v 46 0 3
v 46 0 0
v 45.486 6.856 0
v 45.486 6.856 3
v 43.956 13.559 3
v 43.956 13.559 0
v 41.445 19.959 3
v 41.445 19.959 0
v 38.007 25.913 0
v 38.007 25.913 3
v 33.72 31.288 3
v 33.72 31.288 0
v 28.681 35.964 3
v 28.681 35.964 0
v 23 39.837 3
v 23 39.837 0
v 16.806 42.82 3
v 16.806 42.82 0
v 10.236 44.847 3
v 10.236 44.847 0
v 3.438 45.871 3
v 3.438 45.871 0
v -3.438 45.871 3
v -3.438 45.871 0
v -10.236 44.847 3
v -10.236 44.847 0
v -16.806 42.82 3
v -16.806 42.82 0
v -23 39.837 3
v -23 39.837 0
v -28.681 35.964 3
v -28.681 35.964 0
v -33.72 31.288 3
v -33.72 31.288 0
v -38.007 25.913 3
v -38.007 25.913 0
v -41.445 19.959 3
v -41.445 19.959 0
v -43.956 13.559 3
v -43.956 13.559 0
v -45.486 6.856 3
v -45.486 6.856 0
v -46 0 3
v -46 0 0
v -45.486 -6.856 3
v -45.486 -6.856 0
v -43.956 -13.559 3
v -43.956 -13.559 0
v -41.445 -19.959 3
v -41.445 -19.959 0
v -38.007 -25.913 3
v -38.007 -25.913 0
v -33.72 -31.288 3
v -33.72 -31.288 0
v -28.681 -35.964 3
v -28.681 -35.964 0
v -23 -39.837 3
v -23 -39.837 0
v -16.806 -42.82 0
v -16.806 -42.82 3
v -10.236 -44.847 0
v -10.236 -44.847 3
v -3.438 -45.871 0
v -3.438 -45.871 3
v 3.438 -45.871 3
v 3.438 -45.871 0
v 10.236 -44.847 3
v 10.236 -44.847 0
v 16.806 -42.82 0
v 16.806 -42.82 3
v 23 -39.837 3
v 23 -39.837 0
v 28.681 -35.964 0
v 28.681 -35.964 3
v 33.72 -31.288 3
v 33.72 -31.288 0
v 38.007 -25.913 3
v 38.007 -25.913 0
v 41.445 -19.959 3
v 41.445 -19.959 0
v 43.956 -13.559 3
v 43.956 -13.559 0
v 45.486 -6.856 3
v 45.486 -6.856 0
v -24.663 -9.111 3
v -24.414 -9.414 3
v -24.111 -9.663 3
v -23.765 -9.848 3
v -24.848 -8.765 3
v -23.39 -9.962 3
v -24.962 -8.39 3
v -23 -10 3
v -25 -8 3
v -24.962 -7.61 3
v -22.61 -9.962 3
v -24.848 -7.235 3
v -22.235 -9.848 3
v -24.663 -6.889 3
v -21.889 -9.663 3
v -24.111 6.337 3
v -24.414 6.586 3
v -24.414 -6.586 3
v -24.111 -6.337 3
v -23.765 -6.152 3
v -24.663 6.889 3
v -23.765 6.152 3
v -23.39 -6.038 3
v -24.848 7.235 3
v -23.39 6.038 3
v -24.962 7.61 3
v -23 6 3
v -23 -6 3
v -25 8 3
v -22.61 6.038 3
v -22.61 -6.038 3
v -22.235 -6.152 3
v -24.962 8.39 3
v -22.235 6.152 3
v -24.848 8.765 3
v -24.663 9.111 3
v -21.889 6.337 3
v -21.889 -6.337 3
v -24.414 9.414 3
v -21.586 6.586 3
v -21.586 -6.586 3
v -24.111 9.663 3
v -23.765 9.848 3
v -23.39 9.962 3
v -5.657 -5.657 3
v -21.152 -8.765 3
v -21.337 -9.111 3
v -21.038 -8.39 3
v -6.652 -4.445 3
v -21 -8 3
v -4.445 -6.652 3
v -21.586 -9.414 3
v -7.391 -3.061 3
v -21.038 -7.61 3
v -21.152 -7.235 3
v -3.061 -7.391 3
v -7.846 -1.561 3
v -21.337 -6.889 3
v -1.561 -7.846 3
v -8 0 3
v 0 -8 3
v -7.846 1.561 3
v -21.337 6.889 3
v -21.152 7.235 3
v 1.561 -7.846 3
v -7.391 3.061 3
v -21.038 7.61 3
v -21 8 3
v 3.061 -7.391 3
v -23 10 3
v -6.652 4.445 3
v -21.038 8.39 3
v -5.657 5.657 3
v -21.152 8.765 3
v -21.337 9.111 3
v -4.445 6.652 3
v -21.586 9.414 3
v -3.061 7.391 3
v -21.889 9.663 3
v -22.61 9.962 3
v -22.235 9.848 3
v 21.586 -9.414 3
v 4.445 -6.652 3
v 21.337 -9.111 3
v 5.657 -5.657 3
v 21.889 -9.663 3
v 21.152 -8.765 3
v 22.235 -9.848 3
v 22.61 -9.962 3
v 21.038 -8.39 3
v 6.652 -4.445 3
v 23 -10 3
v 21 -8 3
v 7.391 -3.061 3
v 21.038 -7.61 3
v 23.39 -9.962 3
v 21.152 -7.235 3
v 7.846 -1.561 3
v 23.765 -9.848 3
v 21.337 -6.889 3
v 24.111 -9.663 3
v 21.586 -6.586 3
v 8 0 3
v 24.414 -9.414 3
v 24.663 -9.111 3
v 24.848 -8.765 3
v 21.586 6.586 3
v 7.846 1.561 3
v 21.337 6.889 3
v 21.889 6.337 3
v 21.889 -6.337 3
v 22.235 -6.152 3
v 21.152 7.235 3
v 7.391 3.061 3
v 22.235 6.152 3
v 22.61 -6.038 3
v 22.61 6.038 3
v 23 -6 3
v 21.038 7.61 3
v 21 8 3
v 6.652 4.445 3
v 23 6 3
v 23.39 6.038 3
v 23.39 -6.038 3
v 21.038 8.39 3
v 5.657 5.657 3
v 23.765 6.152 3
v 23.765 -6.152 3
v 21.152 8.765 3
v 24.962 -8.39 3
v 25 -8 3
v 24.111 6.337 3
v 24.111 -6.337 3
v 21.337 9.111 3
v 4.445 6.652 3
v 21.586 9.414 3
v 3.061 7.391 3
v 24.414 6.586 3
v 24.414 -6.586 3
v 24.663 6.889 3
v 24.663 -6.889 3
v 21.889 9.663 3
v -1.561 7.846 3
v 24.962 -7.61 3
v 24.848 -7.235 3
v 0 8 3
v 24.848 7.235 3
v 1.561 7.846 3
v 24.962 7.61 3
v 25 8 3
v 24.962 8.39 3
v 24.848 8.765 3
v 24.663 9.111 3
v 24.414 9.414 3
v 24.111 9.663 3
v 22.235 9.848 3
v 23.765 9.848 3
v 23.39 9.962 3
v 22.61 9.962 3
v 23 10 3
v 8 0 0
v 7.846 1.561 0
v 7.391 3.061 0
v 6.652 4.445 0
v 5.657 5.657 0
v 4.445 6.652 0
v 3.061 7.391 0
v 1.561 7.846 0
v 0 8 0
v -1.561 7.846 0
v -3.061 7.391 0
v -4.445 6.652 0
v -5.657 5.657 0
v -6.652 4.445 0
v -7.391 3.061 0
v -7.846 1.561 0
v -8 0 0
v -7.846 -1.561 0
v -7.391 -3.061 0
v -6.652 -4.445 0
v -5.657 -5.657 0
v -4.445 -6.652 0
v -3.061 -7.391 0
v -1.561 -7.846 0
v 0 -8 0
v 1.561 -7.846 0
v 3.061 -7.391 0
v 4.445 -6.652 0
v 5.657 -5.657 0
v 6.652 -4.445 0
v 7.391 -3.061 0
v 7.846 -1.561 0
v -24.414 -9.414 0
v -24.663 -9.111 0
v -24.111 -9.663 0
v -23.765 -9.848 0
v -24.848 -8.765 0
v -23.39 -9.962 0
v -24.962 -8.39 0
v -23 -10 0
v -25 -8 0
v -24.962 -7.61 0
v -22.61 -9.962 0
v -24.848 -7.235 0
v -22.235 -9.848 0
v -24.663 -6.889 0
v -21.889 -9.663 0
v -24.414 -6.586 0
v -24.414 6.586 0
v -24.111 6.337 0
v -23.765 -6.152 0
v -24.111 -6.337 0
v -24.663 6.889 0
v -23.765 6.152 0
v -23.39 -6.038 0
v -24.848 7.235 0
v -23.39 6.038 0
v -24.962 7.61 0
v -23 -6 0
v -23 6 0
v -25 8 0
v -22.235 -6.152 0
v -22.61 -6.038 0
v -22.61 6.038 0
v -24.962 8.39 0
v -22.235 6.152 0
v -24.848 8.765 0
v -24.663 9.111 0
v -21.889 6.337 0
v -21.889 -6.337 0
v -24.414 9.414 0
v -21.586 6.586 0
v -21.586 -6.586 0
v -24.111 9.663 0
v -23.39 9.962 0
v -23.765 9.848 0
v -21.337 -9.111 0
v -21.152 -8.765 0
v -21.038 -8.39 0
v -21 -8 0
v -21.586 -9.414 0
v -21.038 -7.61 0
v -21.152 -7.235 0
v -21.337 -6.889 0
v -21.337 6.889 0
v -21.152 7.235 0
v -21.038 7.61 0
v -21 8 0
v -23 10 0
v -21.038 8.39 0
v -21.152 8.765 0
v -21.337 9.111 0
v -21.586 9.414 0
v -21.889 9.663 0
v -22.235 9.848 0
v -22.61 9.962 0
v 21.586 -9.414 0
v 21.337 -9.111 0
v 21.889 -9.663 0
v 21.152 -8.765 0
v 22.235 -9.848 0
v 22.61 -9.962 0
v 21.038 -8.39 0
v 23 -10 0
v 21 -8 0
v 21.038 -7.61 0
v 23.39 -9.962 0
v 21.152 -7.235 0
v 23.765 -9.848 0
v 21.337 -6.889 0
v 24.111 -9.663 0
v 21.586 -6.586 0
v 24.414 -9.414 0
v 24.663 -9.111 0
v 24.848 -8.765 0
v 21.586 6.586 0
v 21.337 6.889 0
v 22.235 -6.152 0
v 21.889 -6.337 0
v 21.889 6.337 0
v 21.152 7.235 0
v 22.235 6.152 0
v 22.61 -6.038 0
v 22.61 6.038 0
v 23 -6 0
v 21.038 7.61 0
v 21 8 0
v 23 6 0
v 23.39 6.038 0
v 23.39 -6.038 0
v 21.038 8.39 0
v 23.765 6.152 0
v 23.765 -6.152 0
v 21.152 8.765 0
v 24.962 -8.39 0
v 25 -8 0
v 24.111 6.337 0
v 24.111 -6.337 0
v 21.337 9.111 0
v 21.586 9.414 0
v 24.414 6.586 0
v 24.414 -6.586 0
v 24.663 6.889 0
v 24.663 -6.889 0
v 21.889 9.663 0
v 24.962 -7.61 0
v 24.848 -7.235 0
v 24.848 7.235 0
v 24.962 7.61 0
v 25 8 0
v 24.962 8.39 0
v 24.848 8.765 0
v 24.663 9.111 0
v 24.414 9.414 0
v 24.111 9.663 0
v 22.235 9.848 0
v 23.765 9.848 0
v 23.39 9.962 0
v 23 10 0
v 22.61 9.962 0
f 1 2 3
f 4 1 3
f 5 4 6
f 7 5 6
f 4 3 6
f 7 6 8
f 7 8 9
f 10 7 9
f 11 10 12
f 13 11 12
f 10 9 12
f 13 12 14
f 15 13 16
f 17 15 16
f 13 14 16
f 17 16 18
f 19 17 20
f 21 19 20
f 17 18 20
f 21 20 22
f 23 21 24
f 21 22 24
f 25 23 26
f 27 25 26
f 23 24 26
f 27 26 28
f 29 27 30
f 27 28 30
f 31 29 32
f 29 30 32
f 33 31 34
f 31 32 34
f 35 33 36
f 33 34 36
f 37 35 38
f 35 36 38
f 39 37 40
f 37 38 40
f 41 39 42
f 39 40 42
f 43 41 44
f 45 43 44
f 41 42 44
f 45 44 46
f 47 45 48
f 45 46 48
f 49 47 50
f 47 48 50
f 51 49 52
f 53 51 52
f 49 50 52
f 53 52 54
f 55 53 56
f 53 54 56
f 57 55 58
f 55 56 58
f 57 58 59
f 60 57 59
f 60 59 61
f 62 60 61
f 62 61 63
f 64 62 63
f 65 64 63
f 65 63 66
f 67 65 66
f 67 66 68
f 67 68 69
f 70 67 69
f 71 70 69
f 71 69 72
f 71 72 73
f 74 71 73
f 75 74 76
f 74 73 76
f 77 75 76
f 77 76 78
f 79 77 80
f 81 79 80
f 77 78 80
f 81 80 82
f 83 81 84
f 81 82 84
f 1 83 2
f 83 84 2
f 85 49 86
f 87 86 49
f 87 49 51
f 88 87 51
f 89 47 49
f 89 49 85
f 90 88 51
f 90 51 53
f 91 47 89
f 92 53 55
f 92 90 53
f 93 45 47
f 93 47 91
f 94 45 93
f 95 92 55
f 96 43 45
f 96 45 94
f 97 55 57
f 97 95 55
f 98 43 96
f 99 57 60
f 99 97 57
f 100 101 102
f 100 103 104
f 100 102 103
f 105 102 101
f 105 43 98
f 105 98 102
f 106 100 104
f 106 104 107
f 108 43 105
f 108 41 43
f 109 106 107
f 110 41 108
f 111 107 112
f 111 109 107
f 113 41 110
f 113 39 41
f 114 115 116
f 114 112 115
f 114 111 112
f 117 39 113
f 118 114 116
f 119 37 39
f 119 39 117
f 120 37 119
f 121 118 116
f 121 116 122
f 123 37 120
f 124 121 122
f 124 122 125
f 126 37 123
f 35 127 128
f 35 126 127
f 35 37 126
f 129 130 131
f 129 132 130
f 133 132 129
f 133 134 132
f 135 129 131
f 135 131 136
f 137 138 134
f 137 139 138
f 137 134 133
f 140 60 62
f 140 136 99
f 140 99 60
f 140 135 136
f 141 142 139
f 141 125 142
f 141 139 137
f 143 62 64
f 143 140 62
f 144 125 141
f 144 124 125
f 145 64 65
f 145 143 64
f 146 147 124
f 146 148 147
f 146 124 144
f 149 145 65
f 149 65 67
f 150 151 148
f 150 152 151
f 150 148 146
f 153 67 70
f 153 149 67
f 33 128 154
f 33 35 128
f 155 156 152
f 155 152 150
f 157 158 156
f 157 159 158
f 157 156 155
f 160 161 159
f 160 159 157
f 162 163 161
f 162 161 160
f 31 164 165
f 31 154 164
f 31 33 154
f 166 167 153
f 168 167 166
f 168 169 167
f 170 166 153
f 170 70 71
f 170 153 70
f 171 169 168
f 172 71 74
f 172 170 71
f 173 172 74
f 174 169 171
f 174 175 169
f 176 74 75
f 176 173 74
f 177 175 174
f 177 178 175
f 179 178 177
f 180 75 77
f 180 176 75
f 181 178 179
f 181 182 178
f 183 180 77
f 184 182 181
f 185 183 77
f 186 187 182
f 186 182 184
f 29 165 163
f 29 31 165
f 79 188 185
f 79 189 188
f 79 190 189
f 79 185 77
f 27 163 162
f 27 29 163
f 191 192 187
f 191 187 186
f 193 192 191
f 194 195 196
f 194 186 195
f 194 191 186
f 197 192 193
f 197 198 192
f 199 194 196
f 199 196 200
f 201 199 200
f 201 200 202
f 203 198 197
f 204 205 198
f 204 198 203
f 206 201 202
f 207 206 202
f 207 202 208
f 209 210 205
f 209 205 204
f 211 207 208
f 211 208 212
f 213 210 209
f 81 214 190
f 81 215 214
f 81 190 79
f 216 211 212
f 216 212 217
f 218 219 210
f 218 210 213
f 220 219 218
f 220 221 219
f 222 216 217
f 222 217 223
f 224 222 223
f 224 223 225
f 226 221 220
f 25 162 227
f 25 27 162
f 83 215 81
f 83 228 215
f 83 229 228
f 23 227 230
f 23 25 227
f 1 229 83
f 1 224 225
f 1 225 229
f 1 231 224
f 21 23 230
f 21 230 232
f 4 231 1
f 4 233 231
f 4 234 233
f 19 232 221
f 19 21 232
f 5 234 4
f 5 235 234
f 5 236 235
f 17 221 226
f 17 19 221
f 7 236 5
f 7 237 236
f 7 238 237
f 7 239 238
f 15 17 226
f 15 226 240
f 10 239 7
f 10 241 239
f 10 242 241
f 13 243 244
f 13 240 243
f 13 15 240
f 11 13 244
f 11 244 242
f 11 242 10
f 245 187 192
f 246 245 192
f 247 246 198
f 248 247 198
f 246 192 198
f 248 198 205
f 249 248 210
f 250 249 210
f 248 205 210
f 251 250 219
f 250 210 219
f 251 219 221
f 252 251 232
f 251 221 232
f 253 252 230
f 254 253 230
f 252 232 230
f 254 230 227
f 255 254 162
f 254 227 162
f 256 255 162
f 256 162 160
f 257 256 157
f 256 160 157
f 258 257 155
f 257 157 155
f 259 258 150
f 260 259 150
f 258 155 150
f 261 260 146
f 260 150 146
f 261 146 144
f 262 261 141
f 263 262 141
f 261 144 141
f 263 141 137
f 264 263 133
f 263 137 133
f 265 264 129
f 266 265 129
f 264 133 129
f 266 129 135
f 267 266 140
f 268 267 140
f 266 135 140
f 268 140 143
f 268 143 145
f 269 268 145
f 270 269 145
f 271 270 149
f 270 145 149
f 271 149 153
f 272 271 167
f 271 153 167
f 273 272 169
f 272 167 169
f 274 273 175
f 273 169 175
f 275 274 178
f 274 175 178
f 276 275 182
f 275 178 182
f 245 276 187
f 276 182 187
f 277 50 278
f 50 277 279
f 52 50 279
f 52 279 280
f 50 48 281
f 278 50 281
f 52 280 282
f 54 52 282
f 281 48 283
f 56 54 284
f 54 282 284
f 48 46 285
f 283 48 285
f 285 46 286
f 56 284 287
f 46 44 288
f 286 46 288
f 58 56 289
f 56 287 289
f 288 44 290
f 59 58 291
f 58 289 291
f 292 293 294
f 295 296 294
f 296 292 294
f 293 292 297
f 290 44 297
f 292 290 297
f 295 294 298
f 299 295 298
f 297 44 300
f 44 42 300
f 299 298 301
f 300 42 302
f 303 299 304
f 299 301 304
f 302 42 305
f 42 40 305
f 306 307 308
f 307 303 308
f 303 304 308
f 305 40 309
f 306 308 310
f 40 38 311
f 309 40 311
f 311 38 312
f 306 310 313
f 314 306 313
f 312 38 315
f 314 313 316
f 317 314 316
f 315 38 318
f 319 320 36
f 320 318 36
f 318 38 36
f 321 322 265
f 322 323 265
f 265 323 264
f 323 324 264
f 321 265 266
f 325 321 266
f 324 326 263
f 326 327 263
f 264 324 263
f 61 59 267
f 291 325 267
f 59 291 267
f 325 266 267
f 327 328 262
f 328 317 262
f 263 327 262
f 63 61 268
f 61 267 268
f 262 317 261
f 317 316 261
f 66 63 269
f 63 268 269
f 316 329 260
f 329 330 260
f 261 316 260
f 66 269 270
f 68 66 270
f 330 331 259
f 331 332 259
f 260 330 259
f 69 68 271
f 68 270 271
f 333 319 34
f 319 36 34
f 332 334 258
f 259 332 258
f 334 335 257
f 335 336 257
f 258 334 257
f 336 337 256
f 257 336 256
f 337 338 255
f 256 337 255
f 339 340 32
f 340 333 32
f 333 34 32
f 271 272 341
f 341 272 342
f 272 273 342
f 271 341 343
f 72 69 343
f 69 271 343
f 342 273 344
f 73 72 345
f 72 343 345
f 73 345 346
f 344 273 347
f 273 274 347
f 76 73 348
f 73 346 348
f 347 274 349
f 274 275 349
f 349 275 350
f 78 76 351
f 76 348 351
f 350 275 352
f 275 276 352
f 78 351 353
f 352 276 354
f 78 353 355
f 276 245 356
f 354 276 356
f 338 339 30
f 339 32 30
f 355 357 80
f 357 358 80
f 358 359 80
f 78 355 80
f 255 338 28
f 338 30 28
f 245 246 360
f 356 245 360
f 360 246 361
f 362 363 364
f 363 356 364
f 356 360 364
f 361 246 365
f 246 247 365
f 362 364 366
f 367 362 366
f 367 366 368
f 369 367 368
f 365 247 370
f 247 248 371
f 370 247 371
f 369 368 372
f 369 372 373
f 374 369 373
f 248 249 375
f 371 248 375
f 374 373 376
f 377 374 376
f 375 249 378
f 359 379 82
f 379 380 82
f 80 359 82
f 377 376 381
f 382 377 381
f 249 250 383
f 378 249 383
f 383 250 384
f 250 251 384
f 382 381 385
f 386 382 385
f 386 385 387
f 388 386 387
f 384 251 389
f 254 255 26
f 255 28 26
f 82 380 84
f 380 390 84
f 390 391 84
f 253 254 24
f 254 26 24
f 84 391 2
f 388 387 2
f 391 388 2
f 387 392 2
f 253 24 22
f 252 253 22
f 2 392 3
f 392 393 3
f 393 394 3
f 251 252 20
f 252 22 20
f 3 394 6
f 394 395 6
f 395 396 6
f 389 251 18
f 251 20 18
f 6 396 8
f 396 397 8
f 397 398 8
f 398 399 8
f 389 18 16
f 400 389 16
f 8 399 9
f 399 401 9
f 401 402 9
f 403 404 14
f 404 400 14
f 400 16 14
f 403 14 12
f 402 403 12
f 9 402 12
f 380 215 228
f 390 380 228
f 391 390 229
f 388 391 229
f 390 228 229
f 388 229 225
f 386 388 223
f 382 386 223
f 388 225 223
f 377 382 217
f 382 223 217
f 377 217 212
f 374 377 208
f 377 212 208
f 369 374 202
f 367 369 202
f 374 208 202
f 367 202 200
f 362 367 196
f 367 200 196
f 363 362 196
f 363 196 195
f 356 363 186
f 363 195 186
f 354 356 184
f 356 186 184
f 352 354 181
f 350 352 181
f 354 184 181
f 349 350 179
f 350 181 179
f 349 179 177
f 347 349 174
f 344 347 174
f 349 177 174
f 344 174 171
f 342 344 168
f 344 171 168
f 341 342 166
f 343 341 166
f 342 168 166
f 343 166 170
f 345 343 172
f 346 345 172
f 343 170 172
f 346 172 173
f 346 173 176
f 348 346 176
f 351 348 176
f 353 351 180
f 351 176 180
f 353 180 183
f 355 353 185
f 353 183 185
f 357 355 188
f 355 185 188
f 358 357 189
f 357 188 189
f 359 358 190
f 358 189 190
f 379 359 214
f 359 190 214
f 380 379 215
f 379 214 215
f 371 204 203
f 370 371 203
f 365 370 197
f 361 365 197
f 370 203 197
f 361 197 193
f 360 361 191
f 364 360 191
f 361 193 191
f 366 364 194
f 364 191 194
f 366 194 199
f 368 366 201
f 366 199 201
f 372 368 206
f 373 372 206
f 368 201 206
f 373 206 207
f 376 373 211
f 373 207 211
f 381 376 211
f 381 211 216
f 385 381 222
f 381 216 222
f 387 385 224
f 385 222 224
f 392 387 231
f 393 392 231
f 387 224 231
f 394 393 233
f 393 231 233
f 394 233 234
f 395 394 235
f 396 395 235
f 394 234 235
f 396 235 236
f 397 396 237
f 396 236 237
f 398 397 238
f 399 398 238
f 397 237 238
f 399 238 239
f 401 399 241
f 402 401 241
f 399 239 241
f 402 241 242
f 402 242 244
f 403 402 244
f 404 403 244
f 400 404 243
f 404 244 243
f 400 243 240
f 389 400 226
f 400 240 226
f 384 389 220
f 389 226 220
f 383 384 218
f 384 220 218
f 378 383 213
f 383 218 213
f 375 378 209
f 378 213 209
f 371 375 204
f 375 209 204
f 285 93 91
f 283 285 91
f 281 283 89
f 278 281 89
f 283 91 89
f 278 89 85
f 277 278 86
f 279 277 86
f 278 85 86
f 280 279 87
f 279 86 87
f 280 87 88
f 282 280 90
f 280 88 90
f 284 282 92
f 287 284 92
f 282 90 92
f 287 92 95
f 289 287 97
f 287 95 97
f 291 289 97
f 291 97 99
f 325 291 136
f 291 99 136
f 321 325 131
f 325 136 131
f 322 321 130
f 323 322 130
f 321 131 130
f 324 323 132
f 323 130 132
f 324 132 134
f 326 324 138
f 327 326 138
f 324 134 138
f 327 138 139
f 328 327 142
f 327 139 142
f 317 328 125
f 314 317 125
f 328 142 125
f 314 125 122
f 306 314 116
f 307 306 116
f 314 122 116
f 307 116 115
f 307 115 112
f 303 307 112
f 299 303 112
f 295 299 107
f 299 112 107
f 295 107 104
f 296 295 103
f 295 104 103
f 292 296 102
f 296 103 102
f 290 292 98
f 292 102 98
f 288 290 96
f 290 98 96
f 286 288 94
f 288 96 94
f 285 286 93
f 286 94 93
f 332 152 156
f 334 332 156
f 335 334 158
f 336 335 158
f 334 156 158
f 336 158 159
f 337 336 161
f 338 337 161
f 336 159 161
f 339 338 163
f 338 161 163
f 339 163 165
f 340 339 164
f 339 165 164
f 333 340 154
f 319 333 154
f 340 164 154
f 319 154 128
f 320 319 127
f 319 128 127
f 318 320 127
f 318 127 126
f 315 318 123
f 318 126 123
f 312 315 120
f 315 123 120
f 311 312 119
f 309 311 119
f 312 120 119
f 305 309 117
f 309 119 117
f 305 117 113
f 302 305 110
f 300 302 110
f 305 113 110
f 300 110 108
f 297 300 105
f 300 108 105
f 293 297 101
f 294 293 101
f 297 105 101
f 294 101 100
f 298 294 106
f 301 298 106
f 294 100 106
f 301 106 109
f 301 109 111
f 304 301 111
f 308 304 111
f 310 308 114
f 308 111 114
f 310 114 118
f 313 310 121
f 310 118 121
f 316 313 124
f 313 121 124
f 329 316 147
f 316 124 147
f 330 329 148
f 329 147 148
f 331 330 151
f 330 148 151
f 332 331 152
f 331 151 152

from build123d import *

# Parameters (mm, degrees)
SKETCH_1_R          = 46
EXTRUDE_1_DEPTH     = 3
SKETCH_2_R          = 8
CUT_EXTRUDE_1_DEPTH = 3
SKETCH_3_R          = 2
CUT_EXTRUDE_2_DEPTH = 3


with BuildPart() as part:
    # 스케치1 → 보스-돌출1 (new body)
    with BuildSketch(Plane.XY):
        Circle(SKETCH_1_R)
    extrude(amount=EXTRUDE_1_DEPTH)

    # 스케치2 → 컷-돌출1 (cut)
    with BuildSketch(Plane.XY.offset(3)):
        Circle(SKETCH_2_R)
    extrude(amount=-CUT_EXTRUDE_1_DEPTH, mode=Mode.SUBTRACT)

    # 스케치3 → 컷-돌출2 (cut)
    with BuildSketch(Plane.XY.offset(3)):
        with Locations((-23, 8)):
            Circle(SKETCH_3_R)
        with Locations(Location((-23, -8, 0), (0, 0, 180))):
            Circle(SKETCH_3_R)
        with Locations((23, -8)):
            Circle(SKETCH_3_R)
        with Locations(Location((23, 8, 0), (0, 0, 180))):
            Circle(SKETCH_3_R)
    extrude(amount=-CUT_EXTRUDE_2_DEPTH, mode=Mode.SUBTRACT)


solid = part.part
